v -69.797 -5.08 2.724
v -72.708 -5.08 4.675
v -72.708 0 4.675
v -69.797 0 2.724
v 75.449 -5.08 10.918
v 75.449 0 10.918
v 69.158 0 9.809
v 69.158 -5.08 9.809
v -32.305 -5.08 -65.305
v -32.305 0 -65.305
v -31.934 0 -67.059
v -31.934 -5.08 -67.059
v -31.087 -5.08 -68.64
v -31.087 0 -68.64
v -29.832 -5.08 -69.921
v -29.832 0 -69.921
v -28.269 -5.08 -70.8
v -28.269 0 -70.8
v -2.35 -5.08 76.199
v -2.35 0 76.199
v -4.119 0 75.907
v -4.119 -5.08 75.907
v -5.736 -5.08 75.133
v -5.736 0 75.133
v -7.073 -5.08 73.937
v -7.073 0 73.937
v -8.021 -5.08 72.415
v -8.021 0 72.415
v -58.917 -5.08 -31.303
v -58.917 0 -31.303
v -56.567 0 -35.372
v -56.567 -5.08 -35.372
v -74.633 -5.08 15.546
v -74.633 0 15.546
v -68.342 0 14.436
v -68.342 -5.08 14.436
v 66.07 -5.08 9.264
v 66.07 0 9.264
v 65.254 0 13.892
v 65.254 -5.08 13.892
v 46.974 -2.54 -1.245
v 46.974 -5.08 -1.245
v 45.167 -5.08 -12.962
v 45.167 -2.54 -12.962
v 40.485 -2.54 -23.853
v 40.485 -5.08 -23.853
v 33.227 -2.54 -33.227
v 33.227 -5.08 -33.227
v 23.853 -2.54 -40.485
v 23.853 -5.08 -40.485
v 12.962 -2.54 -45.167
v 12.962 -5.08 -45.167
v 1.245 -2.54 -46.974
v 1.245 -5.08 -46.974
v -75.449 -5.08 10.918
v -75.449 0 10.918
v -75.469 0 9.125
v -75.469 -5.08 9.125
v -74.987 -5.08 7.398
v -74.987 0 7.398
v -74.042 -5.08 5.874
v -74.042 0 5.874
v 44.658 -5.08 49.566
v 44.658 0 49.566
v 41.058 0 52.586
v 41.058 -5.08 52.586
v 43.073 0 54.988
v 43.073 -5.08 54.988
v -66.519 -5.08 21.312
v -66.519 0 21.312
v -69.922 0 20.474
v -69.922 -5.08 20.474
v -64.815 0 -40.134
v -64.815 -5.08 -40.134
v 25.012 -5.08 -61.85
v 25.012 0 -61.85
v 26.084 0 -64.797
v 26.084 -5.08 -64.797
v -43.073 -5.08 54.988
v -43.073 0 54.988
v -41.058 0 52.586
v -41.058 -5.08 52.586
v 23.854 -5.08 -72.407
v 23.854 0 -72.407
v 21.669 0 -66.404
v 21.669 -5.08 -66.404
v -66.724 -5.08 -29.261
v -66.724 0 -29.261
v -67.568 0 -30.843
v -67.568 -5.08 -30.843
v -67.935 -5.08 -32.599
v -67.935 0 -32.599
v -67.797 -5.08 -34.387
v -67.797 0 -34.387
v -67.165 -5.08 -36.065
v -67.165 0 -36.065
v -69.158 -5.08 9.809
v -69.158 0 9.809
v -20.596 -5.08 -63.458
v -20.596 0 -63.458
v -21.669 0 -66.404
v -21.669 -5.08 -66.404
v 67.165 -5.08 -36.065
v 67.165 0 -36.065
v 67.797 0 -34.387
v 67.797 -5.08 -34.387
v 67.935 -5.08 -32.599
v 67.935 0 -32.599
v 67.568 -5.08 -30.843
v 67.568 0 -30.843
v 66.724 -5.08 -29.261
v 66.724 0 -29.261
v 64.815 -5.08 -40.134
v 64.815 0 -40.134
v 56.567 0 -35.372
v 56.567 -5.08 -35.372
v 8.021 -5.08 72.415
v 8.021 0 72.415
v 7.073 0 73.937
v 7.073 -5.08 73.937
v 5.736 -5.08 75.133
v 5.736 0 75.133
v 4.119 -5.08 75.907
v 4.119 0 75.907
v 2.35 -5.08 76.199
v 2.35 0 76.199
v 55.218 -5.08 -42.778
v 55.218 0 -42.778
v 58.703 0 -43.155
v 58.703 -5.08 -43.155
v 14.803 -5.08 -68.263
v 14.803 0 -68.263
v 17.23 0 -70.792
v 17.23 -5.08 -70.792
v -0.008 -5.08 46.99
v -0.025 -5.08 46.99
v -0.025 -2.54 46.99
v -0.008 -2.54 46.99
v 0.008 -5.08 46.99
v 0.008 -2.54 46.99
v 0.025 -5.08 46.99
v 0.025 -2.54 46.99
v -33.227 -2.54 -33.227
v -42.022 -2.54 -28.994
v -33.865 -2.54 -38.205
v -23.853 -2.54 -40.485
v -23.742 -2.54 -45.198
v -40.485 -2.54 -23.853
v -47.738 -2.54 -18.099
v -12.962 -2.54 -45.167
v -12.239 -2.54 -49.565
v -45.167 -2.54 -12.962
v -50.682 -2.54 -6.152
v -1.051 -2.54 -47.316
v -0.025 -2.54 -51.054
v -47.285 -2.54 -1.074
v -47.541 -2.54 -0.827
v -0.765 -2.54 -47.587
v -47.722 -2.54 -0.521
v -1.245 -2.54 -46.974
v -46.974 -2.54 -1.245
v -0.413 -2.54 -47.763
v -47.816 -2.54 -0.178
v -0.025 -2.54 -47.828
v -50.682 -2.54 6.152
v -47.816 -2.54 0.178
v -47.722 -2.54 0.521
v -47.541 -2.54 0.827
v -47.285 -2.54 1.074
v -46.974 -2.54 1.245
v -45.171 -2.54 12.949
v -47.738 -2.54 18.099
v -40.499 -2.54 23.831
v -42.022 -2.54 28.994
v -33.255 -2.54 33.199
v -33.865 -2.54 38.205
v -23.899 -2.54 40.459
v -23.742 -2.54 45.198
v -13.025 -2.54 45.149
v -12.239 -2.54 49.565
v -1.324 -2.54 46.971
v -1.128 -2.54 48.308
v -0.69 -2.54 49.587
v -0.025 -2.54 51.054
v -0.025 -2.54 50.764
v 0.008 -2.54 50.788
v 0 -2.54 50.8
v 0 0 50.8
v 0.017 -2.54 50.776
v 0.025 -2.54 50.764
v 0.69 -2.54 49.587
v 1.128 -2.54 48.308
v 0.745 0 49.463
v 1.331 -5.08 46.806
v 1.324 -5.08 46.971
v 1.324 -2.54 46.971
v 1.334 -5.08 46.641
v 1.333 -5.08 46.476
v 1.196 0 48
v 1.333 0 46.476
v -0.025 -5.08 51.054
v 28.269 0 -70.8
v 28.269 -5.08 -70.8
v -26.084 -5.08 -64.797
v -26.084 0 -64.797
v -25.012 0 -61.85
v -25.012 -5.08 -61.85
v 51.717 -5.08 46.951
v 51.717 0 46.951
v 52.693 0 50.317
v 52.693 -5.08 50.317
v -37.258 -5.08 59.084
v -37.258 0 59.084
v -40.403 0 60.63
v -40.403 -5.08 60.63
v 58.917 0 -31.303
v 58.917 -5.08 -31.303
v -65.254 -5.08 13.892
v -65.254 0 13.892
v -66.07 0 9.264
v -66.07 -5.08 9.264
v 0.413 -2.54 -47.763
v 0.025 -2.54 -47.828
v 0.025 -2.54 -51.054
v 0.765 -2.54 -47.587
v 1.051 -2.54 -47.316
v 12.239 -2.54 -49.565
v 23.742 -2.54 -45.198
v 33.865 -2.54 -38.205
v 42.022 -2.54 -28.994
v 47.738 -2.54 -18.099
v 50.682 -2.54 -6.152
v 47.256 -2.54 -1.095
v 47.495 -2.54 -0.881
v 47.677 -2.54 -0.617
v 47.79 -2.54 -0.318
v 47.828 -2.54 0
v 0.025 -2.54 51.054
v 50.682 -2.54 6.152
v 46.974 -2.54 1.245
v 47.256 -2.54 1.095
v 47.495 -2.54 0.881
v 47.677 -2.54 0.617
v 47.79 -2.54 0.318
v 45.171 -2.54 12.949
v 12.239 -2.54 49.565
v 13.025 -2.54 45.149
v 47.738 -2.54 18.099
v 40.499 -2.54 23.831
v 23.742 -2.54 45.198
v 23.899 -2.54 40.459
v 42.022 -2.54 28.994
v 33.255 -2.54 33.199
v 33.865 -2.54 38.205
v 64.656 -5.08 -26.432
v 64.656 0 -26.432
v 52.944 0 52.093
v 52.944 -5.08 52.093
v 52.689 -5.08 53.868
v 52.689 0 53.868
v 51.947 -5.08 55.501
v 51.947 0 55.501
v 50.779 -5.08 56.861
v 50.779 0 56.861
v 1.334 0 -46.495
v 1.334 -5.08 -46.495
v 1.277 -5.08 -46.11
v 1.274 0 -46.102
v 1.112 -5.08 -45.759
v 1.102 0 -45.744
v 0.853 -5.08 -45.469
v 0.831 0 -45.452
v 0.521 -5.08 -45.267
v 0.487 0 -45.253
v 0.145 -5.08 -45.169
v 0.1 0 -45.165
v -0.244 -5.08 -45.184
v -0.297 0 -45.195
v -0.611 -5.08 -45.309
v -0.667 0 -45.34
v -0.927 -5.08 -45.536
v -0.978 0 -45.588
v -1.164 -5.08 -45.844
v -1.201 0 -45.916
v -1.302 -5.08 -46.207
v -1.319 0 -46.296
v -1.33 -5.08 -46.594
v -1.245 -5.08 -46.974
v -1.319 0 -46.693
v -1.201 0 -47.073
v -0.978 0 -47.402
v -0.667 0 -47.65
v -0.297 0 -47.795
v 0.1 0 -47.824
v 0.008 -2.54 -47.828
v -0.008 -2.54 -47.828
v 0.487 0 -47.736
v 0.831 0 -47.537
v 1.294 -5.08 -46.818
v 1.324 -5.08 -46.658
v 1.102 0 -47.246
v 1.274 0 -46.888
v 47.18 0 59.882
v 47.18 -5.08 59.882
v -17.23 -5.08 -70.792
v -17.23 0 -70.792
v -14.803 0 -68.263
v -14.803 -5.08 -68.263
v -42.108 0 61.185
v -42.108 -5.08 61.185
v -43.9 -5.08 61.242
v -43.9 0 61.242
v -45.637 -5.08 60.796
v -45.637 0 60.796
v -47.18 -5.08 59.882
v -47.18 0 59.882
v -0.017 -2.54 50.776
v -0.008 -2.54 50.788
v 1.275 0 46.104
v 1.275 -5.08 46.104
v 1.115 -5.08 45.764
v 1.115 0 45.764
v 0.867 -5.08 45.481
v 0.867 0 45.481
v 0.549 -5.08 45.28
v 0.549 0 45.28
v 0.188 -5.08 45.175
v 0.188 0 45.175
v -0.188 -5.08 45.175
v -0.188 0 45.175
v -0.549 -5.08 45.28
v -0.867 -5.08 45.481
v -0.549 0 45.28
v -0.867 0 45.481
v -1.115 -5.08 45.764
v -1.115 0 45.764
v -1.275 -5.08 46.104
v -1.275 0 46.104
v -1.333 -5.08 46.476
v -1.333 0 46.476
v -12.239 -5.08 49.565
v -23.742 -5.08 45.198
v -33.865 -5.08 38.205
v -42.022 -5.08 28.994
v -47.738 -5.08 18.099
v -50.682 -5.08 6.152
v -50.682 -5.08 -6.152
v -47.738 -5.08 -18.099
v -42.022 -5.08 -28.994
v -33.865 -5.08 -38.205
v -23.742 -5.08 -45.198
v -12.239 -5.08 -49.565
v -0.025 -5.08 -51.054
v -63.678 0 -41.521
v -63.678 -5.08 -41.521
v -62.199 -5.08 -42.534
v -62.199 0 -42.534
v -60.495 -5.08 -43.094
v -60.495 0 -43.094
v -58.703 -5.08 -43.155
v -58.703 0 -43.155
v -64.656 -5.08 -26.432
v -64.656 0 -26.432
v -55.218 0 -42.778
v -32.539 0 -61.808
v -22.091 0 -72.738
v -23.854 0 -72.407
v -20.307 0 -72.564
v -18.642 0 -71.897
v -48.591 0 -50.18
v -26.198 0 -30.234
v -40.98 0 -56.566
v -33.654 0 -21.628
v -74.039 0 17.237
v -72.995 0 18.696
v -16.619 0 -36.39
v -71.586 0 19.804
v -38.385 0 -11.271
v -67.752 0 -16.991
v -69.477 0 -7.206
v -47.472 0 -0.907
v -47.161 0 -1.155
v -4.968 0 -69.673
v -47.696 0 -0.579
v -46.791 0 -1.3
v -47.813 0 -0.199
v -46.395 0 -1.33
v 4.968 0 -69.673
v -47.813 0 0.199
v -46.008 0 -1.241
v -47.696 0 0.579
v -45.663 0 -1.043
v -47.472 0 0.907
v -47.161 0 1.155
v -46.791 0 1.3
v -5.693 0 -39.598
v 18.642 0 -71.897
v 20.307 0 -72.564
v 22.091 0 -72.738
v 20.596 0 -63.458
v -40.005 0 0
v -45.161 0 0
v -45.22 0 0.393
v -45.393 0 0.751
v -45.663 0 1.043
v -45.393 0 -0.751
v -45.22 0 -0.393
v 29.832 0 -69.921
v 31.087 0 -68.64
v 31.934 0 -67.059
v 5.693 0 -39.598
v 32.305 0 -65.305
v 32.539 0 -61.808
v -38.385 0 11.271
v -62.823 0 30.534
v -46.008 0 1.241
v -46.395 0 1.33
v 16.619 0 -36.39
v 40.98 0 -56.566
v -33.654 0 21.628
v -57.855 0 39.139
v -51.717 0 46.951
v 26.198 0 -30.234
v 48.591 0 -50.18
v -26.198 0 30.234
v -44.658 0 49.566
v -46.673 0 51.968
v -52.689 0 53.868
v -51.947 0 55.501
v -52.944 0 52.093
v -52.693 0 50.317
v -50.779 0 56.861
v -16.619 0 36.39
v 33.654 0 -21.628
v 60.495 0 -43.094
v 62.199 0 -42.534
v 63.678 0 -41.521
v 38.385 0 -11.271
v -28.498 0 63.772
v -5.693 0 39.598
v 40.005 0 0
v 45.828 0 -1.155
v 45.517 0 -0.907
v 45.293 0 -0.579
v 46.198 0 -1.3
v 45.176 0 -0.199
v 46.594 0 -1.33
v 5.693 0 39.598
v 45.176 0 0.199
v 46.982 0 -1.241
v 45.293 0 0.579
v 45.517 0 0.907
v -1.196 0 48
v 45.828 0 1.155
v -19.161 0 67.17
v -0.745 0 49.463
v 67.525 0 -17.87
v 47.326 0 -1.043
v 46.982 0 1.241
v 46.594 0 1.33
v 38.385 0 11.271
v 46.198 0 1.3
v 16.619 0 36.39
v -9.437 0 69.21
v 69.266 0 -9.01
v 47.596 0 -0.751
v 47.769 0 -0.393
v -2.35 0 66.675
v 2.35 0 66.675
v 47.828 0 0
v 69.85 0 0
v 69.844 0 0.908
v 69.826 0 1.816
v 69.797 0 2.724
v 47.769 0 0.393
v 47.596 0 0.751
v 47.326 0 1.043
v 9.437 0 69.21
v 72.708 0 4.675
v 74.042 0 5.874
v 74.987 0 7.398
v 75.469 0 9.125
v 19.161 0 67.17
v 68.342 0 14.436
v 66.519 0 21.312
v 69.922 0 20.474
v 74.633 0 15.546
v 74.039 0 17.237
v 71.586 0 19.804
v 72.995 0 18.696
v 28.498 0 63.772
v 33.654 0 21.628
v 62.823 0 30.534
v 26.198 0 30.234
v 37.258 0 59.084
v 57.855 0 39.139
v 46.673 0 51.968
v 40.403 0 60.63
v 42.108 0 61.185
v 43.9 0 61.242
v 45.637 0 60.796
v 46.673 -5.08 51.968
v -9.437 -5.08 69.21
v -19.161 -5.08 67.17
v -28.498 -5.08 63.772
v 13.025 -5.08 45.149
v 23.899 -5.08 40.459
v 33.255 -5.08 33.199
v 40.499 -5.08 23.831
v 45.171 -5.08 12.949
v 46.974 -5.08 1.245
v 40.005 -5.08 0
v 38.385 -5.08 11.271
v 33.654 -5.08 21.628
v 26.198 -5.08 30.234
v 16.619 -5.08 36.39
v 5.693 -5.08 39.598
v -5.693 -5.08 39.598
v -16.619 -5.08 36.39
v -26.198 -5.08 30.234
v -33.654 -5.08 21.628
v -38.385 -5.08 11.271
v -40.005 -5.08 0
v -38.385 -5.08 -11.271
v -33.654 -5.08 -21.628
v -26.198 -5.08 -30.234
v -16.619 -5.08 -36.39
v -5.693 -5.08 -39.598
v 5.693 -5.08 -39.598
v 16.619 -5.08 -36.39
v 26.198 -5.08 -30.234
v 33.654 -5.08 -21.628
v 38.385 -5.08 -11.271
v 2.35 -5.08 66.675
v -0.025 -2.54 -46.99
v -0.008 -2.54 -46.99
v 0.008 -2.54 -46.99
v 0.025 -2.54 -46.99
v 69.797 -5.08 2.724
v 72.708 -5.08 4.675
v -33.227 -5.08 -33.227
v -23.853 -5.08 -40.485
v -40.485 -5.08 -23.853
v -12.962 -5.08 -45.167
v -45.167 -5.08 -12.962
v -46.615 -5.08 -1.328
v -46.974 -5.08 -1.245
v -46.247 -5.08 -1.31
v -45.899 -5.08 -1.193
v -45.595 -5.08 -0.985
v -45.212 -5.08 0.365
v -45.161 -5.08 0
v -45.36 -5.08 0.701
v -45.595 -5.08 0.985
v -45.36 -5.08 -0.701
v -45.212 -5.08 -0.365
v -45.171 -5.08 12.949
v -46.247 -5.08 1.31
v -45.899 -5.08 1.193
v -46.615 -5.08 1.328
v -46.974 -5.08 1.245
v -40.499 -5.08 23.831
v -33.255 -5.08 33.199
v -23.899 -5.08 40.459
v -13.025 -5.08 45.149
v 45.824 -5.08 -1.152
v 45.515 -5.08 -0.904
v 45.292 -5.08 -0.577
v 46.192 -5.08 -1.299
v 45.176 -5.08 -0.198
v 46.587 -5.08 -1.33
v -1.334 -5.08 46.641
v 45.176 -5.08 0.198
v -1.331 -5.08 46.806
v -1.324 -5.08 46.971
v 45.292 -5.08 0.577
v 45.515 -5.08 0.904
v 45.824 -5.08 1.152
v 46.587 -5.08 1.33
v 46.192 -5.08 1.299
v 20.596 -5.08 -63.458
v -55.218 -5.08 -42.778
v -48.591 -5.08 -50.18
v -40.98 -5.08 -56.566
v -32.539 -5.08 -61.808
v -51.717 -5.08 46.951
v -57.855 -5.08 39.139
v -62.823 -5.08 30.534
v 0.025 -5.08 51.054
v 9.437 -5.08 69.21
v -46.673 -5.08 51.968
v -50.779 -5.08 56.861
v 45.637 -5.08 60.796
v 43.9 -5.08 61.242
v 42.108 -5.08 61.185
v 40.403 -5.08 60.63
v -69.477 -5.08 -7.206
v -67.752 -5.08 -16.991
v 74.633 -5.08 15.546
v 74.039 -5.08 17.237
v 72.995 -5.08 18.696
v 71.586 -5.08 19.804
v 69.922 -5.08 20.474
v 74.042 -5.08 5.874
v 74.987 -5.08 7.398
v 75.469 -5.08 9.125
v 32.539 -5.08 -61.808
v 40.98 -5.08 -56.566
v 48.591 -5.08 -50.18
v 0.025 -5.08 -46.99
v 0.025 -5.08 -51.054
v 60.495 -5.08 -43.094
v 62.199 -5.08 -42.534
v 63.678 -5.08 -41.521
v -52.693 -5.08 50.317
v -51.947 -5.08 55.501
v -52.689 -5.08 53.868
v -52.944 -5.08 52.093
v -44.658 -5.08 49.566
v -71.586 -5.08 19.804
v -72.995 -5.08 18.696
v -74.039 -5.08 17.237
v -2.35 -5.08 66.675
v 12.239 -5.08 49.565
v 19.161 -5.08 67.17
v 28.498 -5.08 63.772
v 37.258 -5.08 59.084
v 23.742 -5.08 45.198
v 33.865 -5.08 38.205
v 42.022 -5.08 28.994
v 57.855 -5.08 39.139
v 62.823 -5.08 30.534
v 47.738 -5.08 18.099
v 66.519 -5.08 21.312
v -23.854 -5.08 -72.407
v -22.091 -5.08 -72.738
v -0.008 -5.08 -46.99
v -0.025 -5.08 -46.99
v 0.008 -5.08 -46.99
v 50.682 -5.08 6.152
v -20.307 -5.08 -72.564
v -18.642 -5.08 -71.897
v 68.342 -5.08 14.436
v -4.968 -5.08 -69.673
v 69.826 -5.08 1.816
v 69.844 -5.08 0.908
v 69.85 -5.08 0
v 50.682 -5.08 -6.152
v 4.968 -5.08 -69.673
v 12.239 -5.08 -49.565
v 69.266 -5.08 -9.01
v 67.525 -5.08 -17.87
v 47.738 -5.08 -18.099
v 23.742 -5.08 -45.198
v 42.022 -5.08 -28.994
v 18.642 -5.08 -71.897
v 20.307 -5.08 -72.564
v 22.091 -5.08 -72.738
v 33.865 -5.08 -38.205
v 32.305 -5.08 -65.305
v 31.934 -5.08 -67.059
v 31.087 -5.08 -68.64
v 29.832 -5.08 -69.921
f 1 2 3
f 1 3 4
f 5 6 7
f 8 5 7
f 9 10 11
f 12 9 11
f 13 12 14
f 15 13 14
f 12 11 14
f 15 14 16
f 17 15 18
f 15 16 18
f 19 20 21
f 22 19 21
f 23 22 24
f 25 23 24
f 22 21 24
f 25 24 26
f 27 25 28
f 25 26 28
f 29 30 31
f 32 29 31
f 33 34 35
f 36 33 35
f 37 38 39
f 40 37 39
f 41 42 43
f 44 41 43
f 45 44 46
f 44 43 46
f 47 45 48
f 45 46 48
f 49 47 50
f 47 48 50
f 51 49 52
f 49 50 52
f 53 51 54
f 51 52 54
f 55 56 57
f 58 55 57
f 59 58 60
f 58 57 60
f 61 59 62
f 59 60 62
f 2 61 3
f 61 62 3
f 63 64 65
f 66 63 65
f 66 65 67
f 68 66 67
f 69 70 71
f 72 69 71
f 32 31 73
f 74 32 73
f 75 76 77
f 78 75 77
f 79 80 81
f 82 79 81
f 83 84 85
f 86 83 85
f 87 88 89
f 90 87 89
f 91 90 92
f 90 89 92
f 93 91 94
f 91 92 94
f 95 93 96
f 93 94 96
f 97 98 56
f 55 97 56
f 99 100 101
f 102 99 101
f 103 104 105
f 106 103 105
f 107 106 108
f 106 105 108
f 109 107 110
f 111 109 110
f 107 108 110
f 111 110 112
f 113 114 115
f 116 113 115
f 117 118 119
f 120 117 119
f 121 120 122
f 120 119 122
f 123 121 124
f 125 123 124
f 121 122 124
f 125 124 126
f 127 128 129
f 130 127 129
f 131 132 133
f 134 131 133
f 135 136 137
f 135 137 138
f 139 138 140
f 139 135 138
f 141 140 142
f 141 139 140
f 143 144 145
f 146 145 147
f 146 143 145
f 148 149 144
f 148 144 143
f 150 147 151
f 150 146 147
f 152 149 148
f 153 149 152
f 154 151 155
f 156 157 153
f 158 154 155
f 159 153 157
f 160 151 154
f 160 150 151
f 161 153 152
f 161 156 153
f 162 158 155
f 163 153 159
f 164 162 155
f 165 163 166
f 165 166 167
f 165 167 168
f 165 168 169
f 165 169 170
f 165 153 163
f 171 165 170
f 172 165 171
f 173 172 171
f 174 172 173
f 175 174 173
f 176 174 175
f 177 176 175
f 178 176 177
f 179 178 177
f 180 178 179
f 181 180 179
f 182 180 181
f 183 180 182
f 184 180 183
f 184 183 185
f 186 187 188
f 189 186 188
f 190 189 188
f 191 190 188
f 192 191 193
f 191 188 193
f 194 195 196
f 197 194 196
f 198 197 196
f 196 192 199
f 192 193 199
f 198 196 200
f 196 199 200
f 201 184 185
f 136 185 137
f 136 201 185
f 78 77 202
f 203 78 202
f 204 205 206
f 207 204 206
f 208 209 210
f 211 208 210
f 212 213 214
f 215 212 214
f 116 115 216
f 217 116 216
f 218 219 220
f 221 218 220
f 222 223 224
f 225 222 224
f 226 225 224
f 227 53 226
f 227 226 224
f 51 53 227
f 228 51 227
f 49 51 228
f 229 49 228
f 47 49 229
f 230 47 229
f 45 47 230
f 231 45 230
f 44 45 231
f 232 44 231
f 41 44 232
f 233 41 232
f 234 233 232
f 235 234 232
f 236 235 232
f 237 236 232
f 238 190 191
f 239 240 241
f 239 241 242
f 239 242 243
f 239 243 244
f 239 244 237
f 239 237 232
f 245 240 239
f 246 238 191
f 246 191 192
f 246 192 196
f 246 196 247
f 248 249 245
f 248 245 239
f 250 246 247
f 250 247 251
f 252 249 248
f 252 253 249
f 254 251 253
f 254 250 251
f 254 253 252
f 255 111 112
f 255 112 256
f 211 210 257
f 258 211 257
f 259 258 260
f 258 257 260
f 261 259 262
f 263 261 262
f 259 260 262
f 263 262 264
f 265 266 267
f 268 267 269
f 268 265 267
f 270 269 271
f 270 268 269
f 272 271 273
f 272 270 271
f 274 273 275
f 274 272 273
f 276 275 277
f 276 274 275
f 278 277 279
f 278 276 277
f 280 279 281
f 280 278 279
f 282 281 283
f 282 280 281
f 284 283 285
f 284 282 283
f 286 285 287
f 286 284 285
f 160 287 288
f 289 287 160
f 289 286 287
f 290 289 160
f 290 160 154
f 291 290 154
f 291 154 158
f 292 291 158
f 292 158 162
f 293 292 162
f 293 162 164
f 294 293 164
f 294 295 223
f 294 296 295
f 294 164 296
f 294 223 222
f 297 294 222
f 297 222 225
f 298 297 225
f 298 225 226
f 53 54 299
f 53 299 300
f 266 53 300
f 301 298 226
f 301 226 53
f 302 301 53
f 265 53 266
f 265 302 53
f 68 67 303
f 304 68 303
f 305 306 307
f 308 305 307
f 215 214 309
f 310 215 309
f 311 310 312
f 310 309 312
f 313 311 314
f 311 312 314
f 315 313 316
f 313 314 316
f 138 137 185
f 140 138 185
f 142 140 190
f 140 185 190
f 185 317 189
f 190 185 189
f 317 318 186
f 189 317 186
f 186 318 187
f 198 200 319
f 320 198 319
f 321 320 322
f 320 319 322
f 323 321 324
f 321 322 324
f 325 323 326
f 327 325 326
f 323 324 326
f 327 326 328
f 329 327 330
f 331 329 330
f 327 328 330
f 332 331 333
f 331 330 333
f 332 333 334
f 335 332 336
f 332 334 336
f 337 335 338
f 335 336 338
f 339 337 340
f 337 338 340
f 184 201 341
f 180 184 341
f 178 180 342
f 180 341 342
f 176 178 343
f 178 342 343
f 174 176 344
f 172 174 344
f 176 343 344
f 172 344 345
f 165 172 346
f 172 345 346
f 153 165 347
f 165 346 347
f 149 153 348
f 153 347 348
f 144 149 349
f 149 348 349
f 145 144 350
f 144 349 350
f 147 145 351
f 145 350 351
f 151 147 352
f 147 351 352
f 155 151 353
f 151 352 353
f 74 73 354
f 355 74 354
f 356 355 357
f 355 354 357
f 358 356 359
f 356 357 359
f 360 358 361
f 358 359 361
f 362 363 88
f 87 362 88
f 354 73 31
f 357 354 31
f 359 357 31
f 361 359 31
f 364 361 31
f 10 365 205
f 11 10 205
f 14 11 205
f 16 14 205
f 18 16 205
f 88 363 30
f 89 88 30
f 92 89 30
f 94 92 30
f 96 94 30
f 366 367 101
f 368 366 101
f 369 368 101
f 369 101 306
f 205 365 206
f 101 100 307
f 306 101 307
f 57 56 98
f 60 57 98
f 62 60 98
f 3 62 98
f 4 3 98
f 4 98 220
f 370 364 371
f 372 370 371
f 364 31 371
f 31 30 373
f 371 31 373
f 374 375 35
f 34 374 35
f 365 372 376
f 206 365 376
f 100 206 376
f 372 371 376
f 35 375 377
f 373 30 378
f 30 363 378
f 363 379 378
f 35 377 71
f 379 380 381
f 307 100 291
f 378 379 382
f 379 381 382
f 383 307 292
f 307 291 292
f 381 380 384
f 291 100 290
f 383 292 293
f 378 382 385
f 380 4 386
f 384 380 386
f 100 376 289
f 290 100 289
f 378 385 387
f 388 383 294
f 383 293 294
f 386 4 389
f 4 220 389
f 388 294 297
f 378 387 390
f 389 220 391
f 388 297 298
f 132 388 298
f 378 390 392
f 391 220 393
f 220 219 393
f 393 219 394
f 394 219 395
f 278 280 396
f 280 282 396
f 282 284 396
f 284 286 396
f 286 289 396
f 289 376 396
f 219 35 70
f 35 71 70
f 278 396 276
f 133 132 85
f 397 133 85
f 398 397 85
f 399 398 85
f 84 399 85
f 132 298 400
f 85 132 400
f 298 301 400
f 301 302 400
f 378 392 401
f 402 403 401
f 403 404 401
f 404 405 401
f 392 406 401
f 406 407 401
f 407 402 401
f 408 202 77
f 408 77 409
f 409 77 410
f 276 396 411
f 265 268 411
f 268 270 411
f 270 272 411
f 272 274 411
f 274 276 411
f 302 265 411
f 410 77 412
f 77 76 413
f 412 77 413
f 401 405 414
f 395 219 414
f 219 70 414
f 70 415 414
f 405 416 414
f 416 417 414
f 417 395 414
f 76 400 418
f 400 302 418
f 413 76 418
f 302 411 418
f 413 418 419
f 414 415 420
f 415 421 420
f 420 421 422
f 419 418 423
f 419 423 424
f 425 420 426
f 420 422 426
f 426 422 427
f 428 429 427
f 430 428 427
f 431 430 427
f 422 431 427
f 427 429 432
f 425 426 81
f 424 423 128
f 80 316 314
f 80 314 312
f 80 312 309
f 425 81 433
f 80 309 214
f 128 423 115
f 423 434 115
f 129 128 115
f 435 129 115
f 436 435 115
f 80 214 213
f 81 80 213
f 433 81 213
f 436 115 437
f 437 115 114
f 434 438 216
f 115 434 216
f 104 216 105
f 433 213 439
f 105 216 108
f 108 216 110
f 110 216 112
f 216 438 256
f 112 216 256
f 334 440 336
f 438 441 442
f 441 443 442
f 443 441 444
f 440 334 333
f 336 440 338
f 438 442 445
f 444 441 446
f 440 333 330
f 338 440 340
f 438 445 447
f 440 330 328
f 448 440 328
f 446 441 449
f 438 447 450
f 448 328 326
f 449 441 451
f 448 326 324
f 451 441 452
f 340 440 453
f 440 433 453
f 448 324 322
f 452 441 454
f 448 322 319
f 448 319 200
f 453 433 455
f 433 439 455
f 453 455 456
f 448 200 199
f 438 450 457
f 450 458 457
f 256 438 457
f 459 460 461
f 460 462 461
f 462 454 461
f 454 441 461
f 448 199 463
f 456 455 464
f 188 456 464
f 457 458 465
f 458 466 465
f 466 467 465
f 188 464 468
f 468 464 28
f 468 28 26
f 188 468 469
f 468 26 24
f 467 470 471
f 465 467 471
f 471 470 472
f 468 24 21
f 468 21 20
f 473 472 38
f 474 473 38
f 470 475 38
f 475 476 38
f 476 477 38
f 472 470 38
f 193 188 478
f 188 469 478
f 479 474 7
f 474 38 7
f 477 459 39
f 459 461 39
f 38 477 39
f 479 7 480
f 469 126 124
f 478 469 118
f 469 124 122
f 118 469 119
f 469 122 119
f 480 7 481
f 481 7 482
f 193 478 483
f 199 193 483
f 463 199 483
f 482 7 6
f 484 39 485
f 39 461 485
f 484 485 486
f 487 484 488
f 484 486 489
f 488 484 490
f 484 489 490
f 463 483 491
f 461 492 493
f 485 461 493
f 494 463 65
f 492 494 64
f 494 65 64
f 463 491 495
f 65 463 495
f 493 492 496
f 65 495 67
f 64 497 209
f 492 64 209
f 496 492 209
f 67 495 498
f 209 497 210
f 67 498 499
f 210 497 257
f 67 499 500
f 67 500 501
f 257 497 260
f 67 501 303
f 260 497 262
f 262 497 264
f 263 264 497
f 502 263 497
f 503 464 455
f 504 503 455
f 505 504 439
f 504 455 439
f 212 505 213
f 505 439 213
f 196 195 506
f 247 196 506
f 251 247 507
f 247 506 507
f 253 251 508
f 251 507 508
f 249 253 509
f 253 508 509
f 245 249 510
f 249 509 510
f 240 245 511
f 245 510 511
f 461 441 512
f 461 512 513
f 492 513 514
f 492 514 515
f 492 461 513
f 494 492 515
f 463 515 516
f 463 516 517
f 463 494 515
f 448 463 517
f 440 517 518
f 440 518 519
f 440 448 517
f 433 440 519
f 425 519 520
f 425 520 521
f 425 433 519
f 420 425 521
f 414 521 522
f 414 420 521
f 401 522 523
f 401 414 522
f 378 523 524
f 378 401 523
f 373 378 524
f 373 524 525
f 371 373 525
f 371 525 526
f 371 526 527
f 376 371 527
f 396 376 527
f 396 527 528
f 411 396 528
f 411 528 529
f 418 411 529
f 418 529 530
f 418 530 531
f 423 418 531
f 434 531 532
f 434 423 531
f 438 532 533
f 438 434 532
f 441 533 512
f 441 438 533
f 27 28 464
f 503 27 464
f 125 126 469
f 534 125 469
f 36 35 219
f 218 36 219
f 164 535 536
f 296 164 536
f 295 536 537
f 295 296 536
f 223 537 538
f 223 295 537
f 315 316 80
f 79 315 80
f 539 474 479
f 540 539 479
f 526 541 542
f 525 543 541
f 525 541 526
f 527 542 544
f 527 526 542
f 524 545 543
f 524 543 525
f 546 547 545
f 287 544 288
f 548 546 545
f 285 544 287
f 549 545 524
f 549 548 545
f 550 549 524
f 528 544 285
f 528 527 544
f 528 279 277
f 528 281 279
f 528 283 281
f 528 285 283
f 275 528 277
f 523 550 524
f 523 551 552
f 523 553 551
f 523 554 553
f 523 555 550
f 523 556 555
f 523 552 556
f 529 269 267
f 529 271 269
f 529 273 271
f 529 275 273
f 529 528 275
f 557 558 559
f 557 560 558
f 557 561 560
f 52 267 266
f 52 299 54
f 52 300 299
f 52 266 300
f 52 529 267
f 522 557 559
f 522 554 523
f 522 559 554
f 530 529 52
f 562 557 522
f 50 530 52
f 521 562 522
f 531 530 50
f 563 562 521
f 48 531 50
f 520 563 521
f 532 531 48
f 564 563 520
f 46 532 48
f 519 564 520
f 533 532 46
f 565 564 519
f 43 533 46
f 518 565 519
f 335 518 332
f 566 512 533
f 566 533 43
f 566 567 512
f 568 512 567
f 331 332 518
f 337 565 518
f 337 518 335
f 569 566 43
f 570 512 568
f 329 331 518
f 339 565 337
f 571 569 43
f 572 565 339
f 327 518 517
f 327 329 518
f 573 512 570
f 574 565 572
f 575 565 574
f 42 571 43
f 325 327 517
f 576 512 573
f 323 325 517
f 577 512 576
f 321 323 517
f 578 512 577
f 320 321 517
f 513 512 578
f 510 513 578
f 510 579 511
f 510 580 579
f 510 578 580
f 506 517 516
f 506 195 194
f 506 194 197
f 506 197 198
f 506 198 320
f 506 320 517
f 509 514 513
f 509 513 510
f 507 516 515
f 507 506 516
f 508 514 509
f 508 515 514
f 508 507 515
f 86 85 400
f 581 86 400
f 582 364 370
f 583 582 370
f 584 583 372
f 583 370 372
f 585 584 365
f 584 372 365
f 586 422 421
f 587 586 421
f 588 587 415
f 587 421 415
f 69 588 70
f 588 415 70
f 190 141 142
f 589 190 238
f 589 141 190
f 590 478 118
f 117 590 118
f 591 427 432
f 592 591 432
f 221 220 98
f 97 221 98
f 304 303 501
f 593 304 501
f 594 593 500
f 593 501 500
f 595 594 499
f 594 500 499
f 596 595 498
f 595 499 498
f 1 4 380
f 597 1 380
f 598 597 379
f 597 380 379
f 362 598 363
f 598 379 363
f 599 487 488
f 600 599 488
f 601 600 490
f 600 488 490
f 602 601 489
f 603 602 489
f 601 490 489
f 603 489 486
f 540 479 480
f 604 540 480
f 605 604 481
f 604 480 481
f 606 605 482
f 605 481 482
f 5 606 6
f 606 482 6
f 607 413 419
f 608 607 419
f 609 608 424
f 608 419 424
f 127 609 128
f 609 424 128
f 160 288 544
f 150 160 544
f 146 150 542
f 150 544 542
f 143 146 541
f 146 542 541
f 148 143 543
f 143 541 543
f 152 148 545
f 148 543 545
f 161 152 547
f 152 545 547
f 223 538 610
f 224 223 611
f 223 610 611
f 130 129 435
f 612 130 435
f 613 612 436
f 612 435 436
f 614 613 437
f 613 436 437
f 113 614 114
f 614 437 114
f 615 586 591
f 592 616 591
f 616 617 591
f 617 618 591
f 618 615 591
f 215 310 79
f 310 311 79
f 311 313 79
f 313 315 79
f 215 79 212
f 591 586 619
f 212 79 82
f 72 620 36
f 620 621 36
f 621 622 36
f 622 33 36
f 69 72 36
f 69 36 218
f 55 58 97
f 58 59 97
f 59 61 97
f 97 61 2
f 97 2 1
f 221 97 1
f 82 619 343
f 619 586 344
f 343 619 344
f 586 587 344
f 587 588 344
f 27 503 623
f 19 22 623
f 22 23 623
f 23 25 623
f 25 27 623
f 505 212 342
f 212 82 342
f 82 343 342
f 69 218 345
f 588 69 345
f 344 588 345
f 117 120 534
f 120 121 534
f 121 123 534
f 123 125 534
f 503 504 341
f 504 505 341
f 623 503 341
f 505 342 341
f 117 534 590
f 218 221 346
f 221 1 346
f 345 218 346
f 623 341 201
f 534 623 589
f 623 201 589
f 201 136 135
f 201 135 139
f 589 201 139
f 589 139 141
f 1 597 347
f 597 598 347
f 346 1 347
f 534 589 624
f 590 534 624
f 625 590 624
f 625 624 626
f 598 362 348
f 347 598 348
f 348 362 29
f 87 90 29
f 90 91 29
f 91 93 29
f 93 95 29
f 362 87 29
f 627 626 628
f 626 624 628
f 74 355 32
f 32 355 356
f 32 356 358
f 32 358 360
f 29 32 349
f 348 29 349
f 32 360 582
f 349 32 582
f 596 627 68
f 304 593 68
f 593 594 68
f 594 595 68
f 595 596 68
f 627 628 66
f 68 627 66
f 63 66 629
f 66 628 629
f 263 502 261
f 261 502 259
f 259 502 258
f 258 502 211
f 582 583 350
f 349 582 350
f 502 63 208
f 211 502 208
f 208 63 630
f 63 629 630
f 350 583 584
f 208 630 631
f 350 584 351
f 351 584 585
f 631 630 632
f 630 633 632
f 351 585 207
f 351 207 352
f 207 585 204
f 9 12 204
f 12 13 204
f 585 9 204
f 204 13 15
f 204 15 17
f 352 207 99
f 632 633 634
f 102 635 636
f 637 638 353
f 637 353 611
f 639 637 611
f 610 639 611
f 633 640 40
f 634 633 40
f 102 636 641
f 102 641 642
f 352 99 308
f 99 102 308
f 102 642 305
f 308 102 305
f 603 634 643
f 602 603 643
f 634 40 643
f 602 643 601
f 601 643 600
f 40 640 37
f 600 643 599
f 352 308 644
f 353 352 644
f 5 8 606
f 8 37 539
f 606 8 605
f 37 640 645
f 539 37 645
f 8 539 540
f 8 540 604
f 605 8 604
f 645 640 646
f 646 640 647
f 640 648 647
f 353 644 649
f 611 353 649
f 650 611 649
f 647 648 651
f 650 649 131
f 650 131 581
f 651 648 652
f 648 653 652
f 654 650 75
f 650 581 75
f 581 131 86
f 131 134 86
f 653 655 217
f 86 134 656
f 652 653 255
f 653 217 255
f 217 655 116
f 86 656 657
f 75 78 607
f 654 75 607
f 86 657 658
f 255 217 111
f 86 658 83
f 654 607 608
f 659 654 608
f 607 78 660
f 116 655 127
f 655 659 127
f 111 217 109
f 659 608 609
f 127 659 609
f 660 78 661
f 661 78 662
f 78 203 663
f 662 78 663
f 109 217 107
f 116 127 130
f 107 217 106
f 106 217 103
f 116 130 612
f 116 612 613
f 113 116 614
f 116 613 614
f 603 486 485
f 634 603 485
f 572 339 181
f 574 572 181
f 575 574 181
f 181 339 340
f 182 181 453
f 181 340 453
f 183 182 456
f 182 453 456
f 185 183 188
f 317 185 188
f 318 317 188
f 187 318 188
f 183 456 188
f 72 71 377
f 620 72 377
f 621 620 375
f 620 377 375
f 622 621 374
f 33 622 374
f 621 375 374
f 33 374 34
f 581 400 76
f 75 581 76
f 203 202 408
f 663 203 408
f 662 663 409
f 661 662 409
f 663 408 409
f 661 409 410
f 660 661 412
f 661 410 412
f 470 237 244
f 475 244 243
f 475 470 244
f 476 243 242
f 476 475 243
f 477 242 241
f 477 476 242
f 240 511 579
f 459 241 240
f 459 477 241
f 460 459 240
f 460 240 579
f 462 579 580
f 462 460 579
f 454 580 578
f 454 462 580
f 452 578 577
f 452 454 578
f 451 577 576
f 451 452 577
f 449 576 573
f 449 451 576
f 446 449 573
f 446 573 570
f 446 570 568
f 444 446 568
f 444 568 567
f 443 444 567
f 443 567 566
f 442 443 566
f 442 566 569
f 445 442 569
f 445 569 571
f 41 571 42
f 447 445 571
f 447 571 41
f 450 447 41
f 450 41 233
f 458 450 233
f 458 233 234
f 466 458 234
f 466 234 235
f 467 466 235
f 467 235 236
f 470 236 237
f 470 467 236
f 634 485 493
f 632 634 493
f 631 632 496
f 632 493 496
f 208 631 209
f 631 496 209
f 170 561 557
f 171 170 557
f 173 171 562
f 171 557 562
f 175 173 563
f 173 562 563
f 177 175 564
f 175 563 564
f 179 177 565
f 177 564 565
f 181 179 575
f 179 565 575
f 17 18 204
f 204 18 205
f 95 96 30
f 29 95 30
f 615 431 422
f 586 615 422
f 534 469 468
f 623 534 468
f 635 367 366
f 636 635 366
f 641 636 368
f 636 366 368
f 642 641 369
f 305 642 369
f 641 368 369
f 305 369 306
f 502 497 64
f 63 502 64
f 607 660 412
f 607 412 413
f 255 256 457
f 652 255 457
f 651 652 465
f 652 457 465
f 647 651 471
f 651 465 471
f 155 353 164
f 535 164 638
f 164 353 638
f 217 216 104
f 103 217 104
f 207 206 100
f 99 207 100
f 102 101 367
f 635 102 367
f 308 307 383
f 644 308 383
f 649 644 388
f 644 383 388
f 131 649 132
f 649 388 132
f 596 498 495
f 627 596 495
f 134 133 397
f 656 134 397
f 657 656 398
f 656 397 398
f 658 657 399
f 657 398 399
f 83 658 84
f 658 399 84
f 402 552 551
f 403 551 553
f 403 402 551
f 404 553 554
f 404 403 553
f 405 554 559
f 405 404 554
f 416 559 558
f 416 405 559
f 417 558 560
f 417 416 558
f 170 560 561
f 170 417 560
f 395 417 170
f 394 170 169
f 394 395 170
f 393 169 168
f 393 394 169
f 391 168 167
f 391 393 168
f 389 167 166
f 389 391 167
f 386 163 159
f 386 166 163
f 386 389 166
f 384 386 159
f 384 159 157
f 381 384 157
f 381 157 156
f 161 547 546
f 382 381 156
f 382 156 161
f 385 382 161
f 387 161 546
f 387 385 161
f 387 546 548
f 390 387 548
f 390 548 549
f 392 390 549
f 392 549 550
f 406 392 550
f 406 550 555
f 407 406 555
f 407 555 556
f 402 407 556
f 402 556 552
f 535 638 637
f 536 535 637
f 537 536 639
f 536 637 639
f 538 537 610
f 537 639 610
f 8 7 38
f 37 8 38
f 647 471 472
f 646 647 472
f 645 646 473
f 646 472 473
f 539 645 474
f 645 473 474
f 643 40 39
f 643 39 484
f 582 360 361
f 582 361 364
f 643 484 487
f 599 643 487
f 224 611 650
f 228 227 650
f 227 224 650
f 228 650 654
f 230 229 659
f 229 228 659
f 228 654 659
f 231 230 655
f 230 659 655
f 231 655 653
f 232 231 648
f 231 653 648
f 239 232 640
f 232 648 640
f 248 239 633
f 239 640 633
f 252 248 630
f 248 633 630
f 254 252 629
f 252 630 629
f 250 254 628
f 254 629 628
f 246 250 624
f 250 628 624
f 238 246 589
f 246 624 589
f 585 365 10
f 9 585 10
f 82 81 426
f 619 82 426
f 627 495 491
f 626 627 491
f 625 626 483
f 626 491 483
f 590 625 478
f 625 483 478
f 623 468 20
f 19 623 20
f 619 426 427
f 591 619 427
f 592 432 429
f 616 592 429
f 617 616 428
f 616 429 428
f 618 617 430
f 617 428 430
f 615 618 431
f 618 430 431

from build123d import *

# Parameters (mm, degrees)
F0_R     = 1.3335
F0_R_2   = 40.005
F1_DEPTH = 5.08
F2_R     = 51.054
F3_DEPTH = 2.54
F5_DEPTH = 2.54


# Not quite as in the source:
# - a pattern or mirror of a feature is missing from the dataset's text; its kind, count and spacing are read off the source's solid


with BuildPart() as f1:
    # F0 (on Front) → F1 (new body)
    with BuildSketch(Plane.XZ):
        with BuildLine():
            ThreePointArc((64.6559292996, -26.4316724103), (68.5391828138, -13.4685900974), (69.85, 0))
            ThreePointArc((69.85, 0), (69.8367147463, 1.3622677557), (69.796864039, 2.7240173131))
            ThreePointArc((69.796864039, 2.7240173131), (69.5676178372, 6.2744759504), (69.1578829213, 9.8086558631))
            Line((69.1578829213, 9.8086558631), (66.0700433255, 9.2641864302))
            Line((66.0700433255, 9.2641864302), (65.2540705387, 13.8917980616))
            Line((65.2540705387, 13.8917980616), (68.3419101345, 14.4362674945))
            ThreePointArc((68.3419101345, 14.4362674945), (67.5181742912, 17.8974478736), (66.5192668833, 21.3121944743))
            ThreePointArc((66.5192668833, 21.3121944743), (60.4918744543, 34.925), (51.7165352668, 46.9512777249))
            ThreePointArc((51.7165352668, 46.9512777249), (49.258731667, 49.5237302165), (46.6731294533, 51.9676965724))
            Line((46.6731294533, 51.9676965724), (44.657685295, 49.565783756))
            Line((44.657685295, 49.565783756), (41.0580424567, 52.5862427339))
            Line((41.0580424567, 52.5862427339), (43.0734866151, 54.9881555503))
            ThreePointArc((43.0734866151, 54.9881555503), (40.2176644871, 57.1100863526), (37.257500213, 59.0838487057))
            ThreePointArc((37.257500213, 59.0838487057), (23.8901070113, 65.6375295619), (9.4374648779, 69.2095134839))
            ThreePointArc((9.4374648779, 69.2095134839), (5.9011375, 69.6002807193), (2.3495, 69.8104744988))
            Line((2.3495, 69.8104744988), (2.3495, 66.675))
            Line((2.3495, 66.675), (-2.3495, 66.675))
            Line((-2.3495, 66.675), (-2.3495, 69.8104744988))
            ThreePointArc((-2.3495, 69.8104744988), (-5.9011375, 69.6002807193), (-9.4374648779, 69.2095134839))
            ThreePointArc((-9.4374648779, 69.2095134839), (-23.8901070113, 65.6375295619), (-37.257500213, 59.0838487057))
            ThreePointArc((-37.257500213, 59.0838487057), (-40.2176644871, 57.1100863526), (-43.0734866151, 54.9881555503))
            Line((-43.0734866151, 54.9881555503), (-41.0580424567, 52.5862427339))
            Line((-41.0580424567, 52.5862427339), (-44.657685295, 49.565783756))
            Line((-44.657685295, 49.565783756), (-46.6731294533, 51.9676965724))
            ThreePointArc((-46.6731294533, 51.9676965724), (-49.258731667, 49.5237302165), (-51.7165352668, 46.9512777249))
            ThreePointArc((-51.7165352668, 46.9512777249), (-60.4918744543, 34.925), (-66.5192668833, 21.3121944743))
            ThreePointArc((-66.5192668833, 21.3121944743), (-67.5181742912, 17.8974478736), (-68.3419101345, 14.4362674945))
            Line((-68.3419101345, 14.4362674945), (-65.2540705387, 13.8917980616))
            Line((-65.2540705387, 13.8917980616), (-66.0700433255, 9.2641864302))
            Line((-66.0700433255, 9.2641864302), (-69.1578829213, 9.8086558631))
            ThreePointArc((-69.1578829213, 9.8086558631), (-69.5676178372, 6.2744759504), (-69.796864039, 2.7240173131))
            ThreePointArc((-69.796864039, 2.7240173131), (-68.7888215479, -12.12932521), (-64.6559292996, -26.4316724103))
            ThreePointArc((-64.6559292996, -26.4316724103), (-63.2261799634, -29.6896053734), (-61.6323943662, -32.8705105632))
            Line((-61.6323943662, -32.8705105632), (-58.9169937973, -31.3027733138))
            Line((-58.9169937973, -31.3027733138), (-56.5674937973, -35.3722266862))
            Line((-56.5674937973, -35.3722266862), (-59.2828943662, -36.9399639356))
            ThreePointArc((-59.2828943662, -36.9399639356), (-57.3250424634, -39.9106753459), (-55.2184644216, -42.7778410736))
            ThreePointArc((-55.2184644216, -42.7778410736), (-44.8987145366, -53.5082043519), (-32.539363826, -61.8078660188))
            ThreePointArc((-32.539363826, -61.8078660188), (-29.3499533501, -63.384562303), (-26.0843963063, -64.7968114134))
            Line((-26.0843963063, -64.7968114134), (-25.0120008688, -61.8504291642))
            Line((-25.0120008688, -61.8504291642), (-20.5963852437, -63.4575818176))
            Line((-20.5963852437, -63.4575818176), (-21.6687806812, -66.4039640668))
            ThreePointArc((-21.6687806812, -66.4039640668), (-18.2594426241, -67.4211780901), (-14.8027316165, -68.2634721992))
            ThreePointArc((-14.8027316165, -68.2634721992), (0, -69.85), (14.8027316165, -68.2634721992))
            ThreePointArc((14.8027316165, -68.2634721992), (18.2594426241, -67.4211780901), (21.6687806812, -66.4039640668))
            Line((21.6687806812, -66.4039640668), (20.5963852437, -63.4575818176))
            Line((20.5963852437, -63.4575818176), (25.0120008688, -61.8504291642))
            Line((25.0120008688, -61.8504291642), (26.0843963063, -64.7968114134))
            ThreePointArc((26.0843963063, -64.7968114134), (29.3499533501, -63.384562303), (32.539363826, -61.8078660188))
            ThreePointArc((32.539363826, -61.8078660188), (44.8987145366, -53.5082043519), (55.2184644216, -42.7778410736))
            ThreePointArc((55.2184644216, -42.7778410736), (57.3250424634, -39.9106753459), (59.2828943662, -36.9399639356))
            Line((59.2828943662, -36.9399639356), (56.5674937973, -35.3722266862))
            Line((56.5674937973, -35.3722266862), (58.9169937973, -31.3027733138))
            Line((58.9169937973, -31.3027733138), (61.6323943662, -32.8705105632))
            ThreePointArc((61.6323943662, -32.8705105632), (63.2261799634, -29.6896053734), (64.6559292996, -26.4316724103))
        make_face()
        with Locations((-46.4947, 0)):
            Circle(F0_R, mode=Mode.SUBTRACT)
        with Locations((0, -46.4947)):
            Circle(F0_R, mode=Mode.SUBTRACT)
        Circle(F0_R_2, mode=Mode.SUBTRACT)
        with Locations((46.4947, 0)):
            Circle(F0_R, mode=Mode.SUBTRACT)
        with BuildLine():
            ThreePointArc((1.3333628788, 46.4755771511), (0, 45.1612), (-1.3333628788, 46.4755771511))
            ThreePointArc((-1.3333628788, 46.4755771511), (-1.0083284803, 48.7431296807), (0, 50.8))
            ThreePointArc((0, 50.8), (1.0083284803, 48.7431296807), (1.3333628788, 46.4755771511))
        make_face(mode=Mode.SUBTRACT)
        with BuildLine():
            ThreePointArc((-43.0734866151, 54.9881555503), (-40.2176644871, 57.1100863526), (-37.257500213, 59.0838487057))
            Line((-37.257500213, 59.0838487057), (-40.4029688253, 60.6296034594))
            ThreePointArc((-40.4029688253, 60.6296034594), (-43.9001960603, 61.242248794), (-47.1796486938, 59.8816889594))
            Line((-47.1796486938, 59.8816889594), (-43.0734866151, 54.9881555503))
        make_face()
        with BuildLine():
            ThreePointArc((-51.7165352668, 46.9512777249), (-49.258731667, 49.5237302165), (-46.6731294533, 51.9676965724))
            Line((-46.6731294533, 51.9676965724), (-50.779291532, 56.8612299815))
            ThreePointArc((-50.779291532, 56.8612299815), (-52.6886523792, 53.8678583382), (-52.69260164, 50.3173770972))
            Line((-52.69260164, 50.3173770972), (-51.7165352668, 46.9512777249))
        make_face()
        with BuildLine():
            ThreePointArc((-9.4374648779, 69.2095134839), (-5.9011375, 69.6002807193), (-2.3495, 69.8104744988))
            Line((-2.3495, 69.8104744988), (-2.3495, 76.1985286816))
            ThreePointArc((-2.3495, 76.1985286816), (-5.7362574703, 75.1327864631), (-8.0214881298, 72.415498574))
            Line((-8.0214881298, 72.415498574), (-9.4374648779, 69.2095134839))
        make_face()
        with BuildLine():
            ThreePointArc((2.3495, 69.8104744988), (5.9011375, 69.6002807193), (9.4374648779, 69.2095134839))
            Line((9.4374648779, 69.2095134839), (8.0214881298, 72.415498574))
            ThreePointArc((8.0214881298, 72.415498574), (5.7362574703, 75.1327864631), (2.3495, 76.1985286816))
            Line((2.3495, 76.1985286816), (2.3495, 69.8104744988))
        make_face()
        with BuildLine():
            ThreePointArc((37.257500213, 59.0838487057), (40.2176644871, 57.1100863526), (43.0734866151, 54.9881555503))
            Line((43.0734866151, 54.9881555503), (47.1796486938, 59.8816889594))
            ThreePointArc((47.1796486938, 59.8816889594), (43.9001960603, 61.242248794), (40.4029688253, 60.6296034594))
            Line((40.4029688253, 60.6296034594), (37.257500213, 59.0838487057))
        make_face()
        with BuildLine():
            ThreePointArc((46.6731294533, 51.9676965724), (49.258731667, 49.5237302165), (51.7165352668, 46.9512777249))
            Line((51.7165352668, 46.9512777249), (52.69260164, 50.3173770972))
            ThreePointArc((52.69260164, 50.3173770972), (52.6886523792, 53.8678583382), (50.779291532, 56.8612299815))
            Line((50.779291532, 56.8612299815), (46.6731294533, 51.9676965724))
        make_face()
        with BuildLine():
            ThreePointArc((66.5192668833, 21.3121944743), (67.5181742912, 17.8974478736), (68.3419101345, 14.4362674945))
            Line((68.3419101345, 14.4362674945), (74.6329154204, 15.5455414622))
            ThreePointArc((74.6329154204, 15.5455414622), (72.9952599579, 18.6957822824), (69.922427638, 20.4744430631))
            Line((69.922427638, 20.4744430631), (66.5192668833, 21.3121944743))
        make_face()
        with BuildLine():
            ThreePointArc((69.1578829213, 9.8086558631), (69.5676178372, 6.2744759504), (69.796864039, 2.7240173131))
            Line((69.796864039, 2.7240173131), (72.7082612299, 4.6751956613))
            ThreePointArc((72.7082612299, 4.6751956613), (74.9874412706, 7.3975606223), (75.4488882072, 10.9179298308))
            Line((75.4488882072, 10.9179298308), (69.1578829213, 9.8086558631))
        make_face()
        with BuildLine():
            Line((66.7244054577, -29.2609367904), (64.6559292996, -26.4316724103))
            ThreePointArc((64.6559292996, -26.4316724103), (63.2261799634, -29.6896053734), (61.6323943662, -32.8705105632))
            Line((61.6323943662, -32.8705105632), (67.1646115693, -36.0645376546))
            ThreePointArc((67.1646115693, -36.0645376546), (67.9350304693, -32.5986485396), (66.7244054577, -29.2609367904))
        make_face()
        with BuildLine():
            Line((64.8151115693, -40.133991027), (59.2828943662, -36.9399639356))
            ThreePointArc((59.2828943662, -36.9399639356), (57.3250424634, -39.9106753459), (55.2184644216, -42.7778410736))
            Line((55.2184644216, -42.7778410736), (58.7029173279, -43.1545617836))
            ThreePointArc((58.7029173279, -43.1545617836), (62.198772999, -42.5341379235), (64.8151115693, -40.133991027))
        make_face()
        with BuildLine():
            Line((23.8536238884, -72.4067714436), (21.6687806812, -66.4039640668))
            ThreePointArc((21.6687806812, -66.4039640668), (18.2594426241, -67.4211780901), (14.8027316165, -68.2634721992))
            Line((14.8027316165, -68.2634721992), (17.229825998, -70.7918201604))
            ThreePointArc((17.229825998, -70.7918201604), (20.3066075788, -72.5636406206), (23.8536238884, -72.4067714436))
        make_face()
        with BuildLine():
            Line((32.3052924046, -65.3047991207), (32.539363826, -61.8078660188))
            ThreePointArc((32.539363826, -61.8078660188), (29.3499533501, -63.384562303), (26.0843963063, -64.7968114134))
            Line((26.0843963063, -64.7968114134), (28.2692395134, -70.7996187901))
            ThreePointArc((28.2692395134, -70.7996187901), (31.0872452104, -68.6398094163), (32.3052924046, -65.3047991207))
        make_face()
        with BuildLine():
            Line((-28.2692395134, -70.7996187901), (-26.0843963063, -64.7968114134))
            ThreePointArc((-26.0843963063, -64.7968114134), (-29.3499533501, -63.384562303), (-32.539363826, -61.8078660188))
            Line((-32.539363826, -61.8078660188), (-32.3052924046, -65.3047991207))
            ThreePointArc((-32.3052924046, -65.3047991207), (-31.0872452104, -68.6398094163), (-28.2692395134, -70.7996187901))
        make_face()
        with BuildLine():
            Line((-17.229825998, -70.7918201604), (-14.8027316165, -68.2634721992))
            ThreePointArc((-14.8027316165, -68.2634721992), (-18.2594426241, -67.4211780901), (-21.6687806812, -66.4039640668))
            Line((-21.6687806812, -66.4039640668), (-23.8536238884, -72.4067714436))
            ThreePointArc((-23.8536238884, -72.4067714436), (-20.3066075788, -72.5636406206), (-17.229825998, -70.7918201604))
        make_face()
        with BuildLine():
            Line((-58.7029173279, -43.1545617836), (-55.2184644216, -42.7778410736))
            ThreePointArc((-55.2184644216, -42.7778410736), (-57.3250424634, -39.9106753459), (-59.2828943662, -36.9399639356))
            Line((-59.2828943662, -36.9399639356), (-64.8151115693, -40.133991027))
            ThreePointArc((-64.8151115693, -40.133991027), (-62.198772999, -42.5341379235), (-58.7029173279, -43.1545617836))
        make_face()
        with BuildLine():
            Line((-67.1646115693, -36.0645376546), (-61.6323943662, -32.8705105632))
            ThreePointArc((-61.6323943662, -32.8705105632), (-63.2261799634, -29.6896053734), (-64.6559292996, -26.4316724103))
            Line((-64.6559292996, -26.4316724103), (-66.7244054577, -29.2609367904))
            ThreePointArc((-66.7244054577, -29.2609367904), (-67.9350304693, -32.5986485396), (-67.1646115693, -36.0645376546))
        make_face()
        with BuildLine():
            Line((-72.7082612299, 4.6751956613), (-69.796864039, 2.7240173131))
            ThreePointArc((-69.796864039, 2.7240173131), (-69.5676178372, 6.2744759504), (-69.1578829213, 9.8086558631))
            Line((-69.1578829213, 9.8086558631), (-75.4488882072, 10.9179298308))
            ThreePointArc((-75.4488882072, 10.9179298308), (-74.9874412706, 7.3975606223), (-72.7082612299, 4.6751956613))
        make_face()
        with BuildLine():
            ThreePointArc((-68.3419101345, 14.4362674945), (-67.5181742912, 17.8974478736), (-66.5192668833, 21.3121944743))
            Line((-66.5192668833, 21.3121944743), (-69.922427638, 20.4744430631))
            ThreePointArc((-69.922427638, 20.4744430631), (-72.9952599579, 18.6957822824), (-74.6329154204, 15.5455414622))
            Line((-74.6329154204, 15.5455414622), (-68.3419101345, 14.4362674945))
        make_face()
    extrude(amount=F1_DEPTH)

    # F2 (on face) → F3 (cut)
    with BuildSketch(Plane.XZ.offset(5.08)):
        Circle(F2_R)
        with BuildLine():
            ThreePointArc((1.3237188184, 46.9713515719), (33.2549291255, 33.1989425865), (46.9735153237, 1.2445714667))
            ThreePointArc((46.9735153237, 1.2445714667), (47.5939548576, 0.7548913882), (47.8282, 0))
            ThreePointArc((47.8282, 0), (47.5939548576, -0.7548913882), (46.9735153237, -1.2445714667))
            ThreePointArc((46.9735153237, -1.2445714667), (33.226947648, -33.226947648), (1.2445714667, -46.9735153237))
            ThreePointArc((1.2445714667, -46.9735153237), (0, -47.8282), (-1.2445714667, -46.9735153237))
            ThreePointArc((-1.2445714667, -46.9735153237), (-33.226947648, -33.226947648), (-46.9735153237, -1.2445714667))
            ThreePointArc((-46.9735153237, -1.2445714667), (-47.8282, 0), (-46.9735153237, 1.2445714667))
            ThreePointArc((-46.9735153237, 1.2445714667), (-33.2549291255, 33.1989425865), (-1.3237188184, 46.9713515719))
            ThreePointArc((-1.3237188184, 46.9713515719), (-0.9312725034, 48.9788228036), (0, 50.8))
            ThreePointArc((0, 50.8), (0.9312725034, 48.9788228036), (1.3237188184, 46.9713515719))
        make_face(mode=Mode.SUBTRACT)
    extrude(amount=-F3_DEPTH, mode=Mode.SUBTRACT)

    # F4 (on face) → F5 (join, through all)
    with BuildSketch(Plane.XZ.offset(5.08)):
        with BuildLine():
            ThreePointArc((0.0254, 51.0539936816), (0, 51.054), (-0.0254, 51.0539936816))
            Line((-0.0254, 51.0539936816), (-0.0254, 46.9899931351))
            ThreePointArc((-0.0254, 46.9899931351), (0, 46.99), (0.0254, 46.9899931351))
            Line((0.0254, 46.9899931351), (0.0254, 51.0539936816))
        make_face()
    f5 = extrude(amount=-F5_DEPTH)

    # F5_copies: F5 across plane
    add(f5.mirror(Plane(origin=(0, 0, 0), x_dir=(-1, 0, 0), z_dir=(0, 0, -1))))


solid = f1.part
